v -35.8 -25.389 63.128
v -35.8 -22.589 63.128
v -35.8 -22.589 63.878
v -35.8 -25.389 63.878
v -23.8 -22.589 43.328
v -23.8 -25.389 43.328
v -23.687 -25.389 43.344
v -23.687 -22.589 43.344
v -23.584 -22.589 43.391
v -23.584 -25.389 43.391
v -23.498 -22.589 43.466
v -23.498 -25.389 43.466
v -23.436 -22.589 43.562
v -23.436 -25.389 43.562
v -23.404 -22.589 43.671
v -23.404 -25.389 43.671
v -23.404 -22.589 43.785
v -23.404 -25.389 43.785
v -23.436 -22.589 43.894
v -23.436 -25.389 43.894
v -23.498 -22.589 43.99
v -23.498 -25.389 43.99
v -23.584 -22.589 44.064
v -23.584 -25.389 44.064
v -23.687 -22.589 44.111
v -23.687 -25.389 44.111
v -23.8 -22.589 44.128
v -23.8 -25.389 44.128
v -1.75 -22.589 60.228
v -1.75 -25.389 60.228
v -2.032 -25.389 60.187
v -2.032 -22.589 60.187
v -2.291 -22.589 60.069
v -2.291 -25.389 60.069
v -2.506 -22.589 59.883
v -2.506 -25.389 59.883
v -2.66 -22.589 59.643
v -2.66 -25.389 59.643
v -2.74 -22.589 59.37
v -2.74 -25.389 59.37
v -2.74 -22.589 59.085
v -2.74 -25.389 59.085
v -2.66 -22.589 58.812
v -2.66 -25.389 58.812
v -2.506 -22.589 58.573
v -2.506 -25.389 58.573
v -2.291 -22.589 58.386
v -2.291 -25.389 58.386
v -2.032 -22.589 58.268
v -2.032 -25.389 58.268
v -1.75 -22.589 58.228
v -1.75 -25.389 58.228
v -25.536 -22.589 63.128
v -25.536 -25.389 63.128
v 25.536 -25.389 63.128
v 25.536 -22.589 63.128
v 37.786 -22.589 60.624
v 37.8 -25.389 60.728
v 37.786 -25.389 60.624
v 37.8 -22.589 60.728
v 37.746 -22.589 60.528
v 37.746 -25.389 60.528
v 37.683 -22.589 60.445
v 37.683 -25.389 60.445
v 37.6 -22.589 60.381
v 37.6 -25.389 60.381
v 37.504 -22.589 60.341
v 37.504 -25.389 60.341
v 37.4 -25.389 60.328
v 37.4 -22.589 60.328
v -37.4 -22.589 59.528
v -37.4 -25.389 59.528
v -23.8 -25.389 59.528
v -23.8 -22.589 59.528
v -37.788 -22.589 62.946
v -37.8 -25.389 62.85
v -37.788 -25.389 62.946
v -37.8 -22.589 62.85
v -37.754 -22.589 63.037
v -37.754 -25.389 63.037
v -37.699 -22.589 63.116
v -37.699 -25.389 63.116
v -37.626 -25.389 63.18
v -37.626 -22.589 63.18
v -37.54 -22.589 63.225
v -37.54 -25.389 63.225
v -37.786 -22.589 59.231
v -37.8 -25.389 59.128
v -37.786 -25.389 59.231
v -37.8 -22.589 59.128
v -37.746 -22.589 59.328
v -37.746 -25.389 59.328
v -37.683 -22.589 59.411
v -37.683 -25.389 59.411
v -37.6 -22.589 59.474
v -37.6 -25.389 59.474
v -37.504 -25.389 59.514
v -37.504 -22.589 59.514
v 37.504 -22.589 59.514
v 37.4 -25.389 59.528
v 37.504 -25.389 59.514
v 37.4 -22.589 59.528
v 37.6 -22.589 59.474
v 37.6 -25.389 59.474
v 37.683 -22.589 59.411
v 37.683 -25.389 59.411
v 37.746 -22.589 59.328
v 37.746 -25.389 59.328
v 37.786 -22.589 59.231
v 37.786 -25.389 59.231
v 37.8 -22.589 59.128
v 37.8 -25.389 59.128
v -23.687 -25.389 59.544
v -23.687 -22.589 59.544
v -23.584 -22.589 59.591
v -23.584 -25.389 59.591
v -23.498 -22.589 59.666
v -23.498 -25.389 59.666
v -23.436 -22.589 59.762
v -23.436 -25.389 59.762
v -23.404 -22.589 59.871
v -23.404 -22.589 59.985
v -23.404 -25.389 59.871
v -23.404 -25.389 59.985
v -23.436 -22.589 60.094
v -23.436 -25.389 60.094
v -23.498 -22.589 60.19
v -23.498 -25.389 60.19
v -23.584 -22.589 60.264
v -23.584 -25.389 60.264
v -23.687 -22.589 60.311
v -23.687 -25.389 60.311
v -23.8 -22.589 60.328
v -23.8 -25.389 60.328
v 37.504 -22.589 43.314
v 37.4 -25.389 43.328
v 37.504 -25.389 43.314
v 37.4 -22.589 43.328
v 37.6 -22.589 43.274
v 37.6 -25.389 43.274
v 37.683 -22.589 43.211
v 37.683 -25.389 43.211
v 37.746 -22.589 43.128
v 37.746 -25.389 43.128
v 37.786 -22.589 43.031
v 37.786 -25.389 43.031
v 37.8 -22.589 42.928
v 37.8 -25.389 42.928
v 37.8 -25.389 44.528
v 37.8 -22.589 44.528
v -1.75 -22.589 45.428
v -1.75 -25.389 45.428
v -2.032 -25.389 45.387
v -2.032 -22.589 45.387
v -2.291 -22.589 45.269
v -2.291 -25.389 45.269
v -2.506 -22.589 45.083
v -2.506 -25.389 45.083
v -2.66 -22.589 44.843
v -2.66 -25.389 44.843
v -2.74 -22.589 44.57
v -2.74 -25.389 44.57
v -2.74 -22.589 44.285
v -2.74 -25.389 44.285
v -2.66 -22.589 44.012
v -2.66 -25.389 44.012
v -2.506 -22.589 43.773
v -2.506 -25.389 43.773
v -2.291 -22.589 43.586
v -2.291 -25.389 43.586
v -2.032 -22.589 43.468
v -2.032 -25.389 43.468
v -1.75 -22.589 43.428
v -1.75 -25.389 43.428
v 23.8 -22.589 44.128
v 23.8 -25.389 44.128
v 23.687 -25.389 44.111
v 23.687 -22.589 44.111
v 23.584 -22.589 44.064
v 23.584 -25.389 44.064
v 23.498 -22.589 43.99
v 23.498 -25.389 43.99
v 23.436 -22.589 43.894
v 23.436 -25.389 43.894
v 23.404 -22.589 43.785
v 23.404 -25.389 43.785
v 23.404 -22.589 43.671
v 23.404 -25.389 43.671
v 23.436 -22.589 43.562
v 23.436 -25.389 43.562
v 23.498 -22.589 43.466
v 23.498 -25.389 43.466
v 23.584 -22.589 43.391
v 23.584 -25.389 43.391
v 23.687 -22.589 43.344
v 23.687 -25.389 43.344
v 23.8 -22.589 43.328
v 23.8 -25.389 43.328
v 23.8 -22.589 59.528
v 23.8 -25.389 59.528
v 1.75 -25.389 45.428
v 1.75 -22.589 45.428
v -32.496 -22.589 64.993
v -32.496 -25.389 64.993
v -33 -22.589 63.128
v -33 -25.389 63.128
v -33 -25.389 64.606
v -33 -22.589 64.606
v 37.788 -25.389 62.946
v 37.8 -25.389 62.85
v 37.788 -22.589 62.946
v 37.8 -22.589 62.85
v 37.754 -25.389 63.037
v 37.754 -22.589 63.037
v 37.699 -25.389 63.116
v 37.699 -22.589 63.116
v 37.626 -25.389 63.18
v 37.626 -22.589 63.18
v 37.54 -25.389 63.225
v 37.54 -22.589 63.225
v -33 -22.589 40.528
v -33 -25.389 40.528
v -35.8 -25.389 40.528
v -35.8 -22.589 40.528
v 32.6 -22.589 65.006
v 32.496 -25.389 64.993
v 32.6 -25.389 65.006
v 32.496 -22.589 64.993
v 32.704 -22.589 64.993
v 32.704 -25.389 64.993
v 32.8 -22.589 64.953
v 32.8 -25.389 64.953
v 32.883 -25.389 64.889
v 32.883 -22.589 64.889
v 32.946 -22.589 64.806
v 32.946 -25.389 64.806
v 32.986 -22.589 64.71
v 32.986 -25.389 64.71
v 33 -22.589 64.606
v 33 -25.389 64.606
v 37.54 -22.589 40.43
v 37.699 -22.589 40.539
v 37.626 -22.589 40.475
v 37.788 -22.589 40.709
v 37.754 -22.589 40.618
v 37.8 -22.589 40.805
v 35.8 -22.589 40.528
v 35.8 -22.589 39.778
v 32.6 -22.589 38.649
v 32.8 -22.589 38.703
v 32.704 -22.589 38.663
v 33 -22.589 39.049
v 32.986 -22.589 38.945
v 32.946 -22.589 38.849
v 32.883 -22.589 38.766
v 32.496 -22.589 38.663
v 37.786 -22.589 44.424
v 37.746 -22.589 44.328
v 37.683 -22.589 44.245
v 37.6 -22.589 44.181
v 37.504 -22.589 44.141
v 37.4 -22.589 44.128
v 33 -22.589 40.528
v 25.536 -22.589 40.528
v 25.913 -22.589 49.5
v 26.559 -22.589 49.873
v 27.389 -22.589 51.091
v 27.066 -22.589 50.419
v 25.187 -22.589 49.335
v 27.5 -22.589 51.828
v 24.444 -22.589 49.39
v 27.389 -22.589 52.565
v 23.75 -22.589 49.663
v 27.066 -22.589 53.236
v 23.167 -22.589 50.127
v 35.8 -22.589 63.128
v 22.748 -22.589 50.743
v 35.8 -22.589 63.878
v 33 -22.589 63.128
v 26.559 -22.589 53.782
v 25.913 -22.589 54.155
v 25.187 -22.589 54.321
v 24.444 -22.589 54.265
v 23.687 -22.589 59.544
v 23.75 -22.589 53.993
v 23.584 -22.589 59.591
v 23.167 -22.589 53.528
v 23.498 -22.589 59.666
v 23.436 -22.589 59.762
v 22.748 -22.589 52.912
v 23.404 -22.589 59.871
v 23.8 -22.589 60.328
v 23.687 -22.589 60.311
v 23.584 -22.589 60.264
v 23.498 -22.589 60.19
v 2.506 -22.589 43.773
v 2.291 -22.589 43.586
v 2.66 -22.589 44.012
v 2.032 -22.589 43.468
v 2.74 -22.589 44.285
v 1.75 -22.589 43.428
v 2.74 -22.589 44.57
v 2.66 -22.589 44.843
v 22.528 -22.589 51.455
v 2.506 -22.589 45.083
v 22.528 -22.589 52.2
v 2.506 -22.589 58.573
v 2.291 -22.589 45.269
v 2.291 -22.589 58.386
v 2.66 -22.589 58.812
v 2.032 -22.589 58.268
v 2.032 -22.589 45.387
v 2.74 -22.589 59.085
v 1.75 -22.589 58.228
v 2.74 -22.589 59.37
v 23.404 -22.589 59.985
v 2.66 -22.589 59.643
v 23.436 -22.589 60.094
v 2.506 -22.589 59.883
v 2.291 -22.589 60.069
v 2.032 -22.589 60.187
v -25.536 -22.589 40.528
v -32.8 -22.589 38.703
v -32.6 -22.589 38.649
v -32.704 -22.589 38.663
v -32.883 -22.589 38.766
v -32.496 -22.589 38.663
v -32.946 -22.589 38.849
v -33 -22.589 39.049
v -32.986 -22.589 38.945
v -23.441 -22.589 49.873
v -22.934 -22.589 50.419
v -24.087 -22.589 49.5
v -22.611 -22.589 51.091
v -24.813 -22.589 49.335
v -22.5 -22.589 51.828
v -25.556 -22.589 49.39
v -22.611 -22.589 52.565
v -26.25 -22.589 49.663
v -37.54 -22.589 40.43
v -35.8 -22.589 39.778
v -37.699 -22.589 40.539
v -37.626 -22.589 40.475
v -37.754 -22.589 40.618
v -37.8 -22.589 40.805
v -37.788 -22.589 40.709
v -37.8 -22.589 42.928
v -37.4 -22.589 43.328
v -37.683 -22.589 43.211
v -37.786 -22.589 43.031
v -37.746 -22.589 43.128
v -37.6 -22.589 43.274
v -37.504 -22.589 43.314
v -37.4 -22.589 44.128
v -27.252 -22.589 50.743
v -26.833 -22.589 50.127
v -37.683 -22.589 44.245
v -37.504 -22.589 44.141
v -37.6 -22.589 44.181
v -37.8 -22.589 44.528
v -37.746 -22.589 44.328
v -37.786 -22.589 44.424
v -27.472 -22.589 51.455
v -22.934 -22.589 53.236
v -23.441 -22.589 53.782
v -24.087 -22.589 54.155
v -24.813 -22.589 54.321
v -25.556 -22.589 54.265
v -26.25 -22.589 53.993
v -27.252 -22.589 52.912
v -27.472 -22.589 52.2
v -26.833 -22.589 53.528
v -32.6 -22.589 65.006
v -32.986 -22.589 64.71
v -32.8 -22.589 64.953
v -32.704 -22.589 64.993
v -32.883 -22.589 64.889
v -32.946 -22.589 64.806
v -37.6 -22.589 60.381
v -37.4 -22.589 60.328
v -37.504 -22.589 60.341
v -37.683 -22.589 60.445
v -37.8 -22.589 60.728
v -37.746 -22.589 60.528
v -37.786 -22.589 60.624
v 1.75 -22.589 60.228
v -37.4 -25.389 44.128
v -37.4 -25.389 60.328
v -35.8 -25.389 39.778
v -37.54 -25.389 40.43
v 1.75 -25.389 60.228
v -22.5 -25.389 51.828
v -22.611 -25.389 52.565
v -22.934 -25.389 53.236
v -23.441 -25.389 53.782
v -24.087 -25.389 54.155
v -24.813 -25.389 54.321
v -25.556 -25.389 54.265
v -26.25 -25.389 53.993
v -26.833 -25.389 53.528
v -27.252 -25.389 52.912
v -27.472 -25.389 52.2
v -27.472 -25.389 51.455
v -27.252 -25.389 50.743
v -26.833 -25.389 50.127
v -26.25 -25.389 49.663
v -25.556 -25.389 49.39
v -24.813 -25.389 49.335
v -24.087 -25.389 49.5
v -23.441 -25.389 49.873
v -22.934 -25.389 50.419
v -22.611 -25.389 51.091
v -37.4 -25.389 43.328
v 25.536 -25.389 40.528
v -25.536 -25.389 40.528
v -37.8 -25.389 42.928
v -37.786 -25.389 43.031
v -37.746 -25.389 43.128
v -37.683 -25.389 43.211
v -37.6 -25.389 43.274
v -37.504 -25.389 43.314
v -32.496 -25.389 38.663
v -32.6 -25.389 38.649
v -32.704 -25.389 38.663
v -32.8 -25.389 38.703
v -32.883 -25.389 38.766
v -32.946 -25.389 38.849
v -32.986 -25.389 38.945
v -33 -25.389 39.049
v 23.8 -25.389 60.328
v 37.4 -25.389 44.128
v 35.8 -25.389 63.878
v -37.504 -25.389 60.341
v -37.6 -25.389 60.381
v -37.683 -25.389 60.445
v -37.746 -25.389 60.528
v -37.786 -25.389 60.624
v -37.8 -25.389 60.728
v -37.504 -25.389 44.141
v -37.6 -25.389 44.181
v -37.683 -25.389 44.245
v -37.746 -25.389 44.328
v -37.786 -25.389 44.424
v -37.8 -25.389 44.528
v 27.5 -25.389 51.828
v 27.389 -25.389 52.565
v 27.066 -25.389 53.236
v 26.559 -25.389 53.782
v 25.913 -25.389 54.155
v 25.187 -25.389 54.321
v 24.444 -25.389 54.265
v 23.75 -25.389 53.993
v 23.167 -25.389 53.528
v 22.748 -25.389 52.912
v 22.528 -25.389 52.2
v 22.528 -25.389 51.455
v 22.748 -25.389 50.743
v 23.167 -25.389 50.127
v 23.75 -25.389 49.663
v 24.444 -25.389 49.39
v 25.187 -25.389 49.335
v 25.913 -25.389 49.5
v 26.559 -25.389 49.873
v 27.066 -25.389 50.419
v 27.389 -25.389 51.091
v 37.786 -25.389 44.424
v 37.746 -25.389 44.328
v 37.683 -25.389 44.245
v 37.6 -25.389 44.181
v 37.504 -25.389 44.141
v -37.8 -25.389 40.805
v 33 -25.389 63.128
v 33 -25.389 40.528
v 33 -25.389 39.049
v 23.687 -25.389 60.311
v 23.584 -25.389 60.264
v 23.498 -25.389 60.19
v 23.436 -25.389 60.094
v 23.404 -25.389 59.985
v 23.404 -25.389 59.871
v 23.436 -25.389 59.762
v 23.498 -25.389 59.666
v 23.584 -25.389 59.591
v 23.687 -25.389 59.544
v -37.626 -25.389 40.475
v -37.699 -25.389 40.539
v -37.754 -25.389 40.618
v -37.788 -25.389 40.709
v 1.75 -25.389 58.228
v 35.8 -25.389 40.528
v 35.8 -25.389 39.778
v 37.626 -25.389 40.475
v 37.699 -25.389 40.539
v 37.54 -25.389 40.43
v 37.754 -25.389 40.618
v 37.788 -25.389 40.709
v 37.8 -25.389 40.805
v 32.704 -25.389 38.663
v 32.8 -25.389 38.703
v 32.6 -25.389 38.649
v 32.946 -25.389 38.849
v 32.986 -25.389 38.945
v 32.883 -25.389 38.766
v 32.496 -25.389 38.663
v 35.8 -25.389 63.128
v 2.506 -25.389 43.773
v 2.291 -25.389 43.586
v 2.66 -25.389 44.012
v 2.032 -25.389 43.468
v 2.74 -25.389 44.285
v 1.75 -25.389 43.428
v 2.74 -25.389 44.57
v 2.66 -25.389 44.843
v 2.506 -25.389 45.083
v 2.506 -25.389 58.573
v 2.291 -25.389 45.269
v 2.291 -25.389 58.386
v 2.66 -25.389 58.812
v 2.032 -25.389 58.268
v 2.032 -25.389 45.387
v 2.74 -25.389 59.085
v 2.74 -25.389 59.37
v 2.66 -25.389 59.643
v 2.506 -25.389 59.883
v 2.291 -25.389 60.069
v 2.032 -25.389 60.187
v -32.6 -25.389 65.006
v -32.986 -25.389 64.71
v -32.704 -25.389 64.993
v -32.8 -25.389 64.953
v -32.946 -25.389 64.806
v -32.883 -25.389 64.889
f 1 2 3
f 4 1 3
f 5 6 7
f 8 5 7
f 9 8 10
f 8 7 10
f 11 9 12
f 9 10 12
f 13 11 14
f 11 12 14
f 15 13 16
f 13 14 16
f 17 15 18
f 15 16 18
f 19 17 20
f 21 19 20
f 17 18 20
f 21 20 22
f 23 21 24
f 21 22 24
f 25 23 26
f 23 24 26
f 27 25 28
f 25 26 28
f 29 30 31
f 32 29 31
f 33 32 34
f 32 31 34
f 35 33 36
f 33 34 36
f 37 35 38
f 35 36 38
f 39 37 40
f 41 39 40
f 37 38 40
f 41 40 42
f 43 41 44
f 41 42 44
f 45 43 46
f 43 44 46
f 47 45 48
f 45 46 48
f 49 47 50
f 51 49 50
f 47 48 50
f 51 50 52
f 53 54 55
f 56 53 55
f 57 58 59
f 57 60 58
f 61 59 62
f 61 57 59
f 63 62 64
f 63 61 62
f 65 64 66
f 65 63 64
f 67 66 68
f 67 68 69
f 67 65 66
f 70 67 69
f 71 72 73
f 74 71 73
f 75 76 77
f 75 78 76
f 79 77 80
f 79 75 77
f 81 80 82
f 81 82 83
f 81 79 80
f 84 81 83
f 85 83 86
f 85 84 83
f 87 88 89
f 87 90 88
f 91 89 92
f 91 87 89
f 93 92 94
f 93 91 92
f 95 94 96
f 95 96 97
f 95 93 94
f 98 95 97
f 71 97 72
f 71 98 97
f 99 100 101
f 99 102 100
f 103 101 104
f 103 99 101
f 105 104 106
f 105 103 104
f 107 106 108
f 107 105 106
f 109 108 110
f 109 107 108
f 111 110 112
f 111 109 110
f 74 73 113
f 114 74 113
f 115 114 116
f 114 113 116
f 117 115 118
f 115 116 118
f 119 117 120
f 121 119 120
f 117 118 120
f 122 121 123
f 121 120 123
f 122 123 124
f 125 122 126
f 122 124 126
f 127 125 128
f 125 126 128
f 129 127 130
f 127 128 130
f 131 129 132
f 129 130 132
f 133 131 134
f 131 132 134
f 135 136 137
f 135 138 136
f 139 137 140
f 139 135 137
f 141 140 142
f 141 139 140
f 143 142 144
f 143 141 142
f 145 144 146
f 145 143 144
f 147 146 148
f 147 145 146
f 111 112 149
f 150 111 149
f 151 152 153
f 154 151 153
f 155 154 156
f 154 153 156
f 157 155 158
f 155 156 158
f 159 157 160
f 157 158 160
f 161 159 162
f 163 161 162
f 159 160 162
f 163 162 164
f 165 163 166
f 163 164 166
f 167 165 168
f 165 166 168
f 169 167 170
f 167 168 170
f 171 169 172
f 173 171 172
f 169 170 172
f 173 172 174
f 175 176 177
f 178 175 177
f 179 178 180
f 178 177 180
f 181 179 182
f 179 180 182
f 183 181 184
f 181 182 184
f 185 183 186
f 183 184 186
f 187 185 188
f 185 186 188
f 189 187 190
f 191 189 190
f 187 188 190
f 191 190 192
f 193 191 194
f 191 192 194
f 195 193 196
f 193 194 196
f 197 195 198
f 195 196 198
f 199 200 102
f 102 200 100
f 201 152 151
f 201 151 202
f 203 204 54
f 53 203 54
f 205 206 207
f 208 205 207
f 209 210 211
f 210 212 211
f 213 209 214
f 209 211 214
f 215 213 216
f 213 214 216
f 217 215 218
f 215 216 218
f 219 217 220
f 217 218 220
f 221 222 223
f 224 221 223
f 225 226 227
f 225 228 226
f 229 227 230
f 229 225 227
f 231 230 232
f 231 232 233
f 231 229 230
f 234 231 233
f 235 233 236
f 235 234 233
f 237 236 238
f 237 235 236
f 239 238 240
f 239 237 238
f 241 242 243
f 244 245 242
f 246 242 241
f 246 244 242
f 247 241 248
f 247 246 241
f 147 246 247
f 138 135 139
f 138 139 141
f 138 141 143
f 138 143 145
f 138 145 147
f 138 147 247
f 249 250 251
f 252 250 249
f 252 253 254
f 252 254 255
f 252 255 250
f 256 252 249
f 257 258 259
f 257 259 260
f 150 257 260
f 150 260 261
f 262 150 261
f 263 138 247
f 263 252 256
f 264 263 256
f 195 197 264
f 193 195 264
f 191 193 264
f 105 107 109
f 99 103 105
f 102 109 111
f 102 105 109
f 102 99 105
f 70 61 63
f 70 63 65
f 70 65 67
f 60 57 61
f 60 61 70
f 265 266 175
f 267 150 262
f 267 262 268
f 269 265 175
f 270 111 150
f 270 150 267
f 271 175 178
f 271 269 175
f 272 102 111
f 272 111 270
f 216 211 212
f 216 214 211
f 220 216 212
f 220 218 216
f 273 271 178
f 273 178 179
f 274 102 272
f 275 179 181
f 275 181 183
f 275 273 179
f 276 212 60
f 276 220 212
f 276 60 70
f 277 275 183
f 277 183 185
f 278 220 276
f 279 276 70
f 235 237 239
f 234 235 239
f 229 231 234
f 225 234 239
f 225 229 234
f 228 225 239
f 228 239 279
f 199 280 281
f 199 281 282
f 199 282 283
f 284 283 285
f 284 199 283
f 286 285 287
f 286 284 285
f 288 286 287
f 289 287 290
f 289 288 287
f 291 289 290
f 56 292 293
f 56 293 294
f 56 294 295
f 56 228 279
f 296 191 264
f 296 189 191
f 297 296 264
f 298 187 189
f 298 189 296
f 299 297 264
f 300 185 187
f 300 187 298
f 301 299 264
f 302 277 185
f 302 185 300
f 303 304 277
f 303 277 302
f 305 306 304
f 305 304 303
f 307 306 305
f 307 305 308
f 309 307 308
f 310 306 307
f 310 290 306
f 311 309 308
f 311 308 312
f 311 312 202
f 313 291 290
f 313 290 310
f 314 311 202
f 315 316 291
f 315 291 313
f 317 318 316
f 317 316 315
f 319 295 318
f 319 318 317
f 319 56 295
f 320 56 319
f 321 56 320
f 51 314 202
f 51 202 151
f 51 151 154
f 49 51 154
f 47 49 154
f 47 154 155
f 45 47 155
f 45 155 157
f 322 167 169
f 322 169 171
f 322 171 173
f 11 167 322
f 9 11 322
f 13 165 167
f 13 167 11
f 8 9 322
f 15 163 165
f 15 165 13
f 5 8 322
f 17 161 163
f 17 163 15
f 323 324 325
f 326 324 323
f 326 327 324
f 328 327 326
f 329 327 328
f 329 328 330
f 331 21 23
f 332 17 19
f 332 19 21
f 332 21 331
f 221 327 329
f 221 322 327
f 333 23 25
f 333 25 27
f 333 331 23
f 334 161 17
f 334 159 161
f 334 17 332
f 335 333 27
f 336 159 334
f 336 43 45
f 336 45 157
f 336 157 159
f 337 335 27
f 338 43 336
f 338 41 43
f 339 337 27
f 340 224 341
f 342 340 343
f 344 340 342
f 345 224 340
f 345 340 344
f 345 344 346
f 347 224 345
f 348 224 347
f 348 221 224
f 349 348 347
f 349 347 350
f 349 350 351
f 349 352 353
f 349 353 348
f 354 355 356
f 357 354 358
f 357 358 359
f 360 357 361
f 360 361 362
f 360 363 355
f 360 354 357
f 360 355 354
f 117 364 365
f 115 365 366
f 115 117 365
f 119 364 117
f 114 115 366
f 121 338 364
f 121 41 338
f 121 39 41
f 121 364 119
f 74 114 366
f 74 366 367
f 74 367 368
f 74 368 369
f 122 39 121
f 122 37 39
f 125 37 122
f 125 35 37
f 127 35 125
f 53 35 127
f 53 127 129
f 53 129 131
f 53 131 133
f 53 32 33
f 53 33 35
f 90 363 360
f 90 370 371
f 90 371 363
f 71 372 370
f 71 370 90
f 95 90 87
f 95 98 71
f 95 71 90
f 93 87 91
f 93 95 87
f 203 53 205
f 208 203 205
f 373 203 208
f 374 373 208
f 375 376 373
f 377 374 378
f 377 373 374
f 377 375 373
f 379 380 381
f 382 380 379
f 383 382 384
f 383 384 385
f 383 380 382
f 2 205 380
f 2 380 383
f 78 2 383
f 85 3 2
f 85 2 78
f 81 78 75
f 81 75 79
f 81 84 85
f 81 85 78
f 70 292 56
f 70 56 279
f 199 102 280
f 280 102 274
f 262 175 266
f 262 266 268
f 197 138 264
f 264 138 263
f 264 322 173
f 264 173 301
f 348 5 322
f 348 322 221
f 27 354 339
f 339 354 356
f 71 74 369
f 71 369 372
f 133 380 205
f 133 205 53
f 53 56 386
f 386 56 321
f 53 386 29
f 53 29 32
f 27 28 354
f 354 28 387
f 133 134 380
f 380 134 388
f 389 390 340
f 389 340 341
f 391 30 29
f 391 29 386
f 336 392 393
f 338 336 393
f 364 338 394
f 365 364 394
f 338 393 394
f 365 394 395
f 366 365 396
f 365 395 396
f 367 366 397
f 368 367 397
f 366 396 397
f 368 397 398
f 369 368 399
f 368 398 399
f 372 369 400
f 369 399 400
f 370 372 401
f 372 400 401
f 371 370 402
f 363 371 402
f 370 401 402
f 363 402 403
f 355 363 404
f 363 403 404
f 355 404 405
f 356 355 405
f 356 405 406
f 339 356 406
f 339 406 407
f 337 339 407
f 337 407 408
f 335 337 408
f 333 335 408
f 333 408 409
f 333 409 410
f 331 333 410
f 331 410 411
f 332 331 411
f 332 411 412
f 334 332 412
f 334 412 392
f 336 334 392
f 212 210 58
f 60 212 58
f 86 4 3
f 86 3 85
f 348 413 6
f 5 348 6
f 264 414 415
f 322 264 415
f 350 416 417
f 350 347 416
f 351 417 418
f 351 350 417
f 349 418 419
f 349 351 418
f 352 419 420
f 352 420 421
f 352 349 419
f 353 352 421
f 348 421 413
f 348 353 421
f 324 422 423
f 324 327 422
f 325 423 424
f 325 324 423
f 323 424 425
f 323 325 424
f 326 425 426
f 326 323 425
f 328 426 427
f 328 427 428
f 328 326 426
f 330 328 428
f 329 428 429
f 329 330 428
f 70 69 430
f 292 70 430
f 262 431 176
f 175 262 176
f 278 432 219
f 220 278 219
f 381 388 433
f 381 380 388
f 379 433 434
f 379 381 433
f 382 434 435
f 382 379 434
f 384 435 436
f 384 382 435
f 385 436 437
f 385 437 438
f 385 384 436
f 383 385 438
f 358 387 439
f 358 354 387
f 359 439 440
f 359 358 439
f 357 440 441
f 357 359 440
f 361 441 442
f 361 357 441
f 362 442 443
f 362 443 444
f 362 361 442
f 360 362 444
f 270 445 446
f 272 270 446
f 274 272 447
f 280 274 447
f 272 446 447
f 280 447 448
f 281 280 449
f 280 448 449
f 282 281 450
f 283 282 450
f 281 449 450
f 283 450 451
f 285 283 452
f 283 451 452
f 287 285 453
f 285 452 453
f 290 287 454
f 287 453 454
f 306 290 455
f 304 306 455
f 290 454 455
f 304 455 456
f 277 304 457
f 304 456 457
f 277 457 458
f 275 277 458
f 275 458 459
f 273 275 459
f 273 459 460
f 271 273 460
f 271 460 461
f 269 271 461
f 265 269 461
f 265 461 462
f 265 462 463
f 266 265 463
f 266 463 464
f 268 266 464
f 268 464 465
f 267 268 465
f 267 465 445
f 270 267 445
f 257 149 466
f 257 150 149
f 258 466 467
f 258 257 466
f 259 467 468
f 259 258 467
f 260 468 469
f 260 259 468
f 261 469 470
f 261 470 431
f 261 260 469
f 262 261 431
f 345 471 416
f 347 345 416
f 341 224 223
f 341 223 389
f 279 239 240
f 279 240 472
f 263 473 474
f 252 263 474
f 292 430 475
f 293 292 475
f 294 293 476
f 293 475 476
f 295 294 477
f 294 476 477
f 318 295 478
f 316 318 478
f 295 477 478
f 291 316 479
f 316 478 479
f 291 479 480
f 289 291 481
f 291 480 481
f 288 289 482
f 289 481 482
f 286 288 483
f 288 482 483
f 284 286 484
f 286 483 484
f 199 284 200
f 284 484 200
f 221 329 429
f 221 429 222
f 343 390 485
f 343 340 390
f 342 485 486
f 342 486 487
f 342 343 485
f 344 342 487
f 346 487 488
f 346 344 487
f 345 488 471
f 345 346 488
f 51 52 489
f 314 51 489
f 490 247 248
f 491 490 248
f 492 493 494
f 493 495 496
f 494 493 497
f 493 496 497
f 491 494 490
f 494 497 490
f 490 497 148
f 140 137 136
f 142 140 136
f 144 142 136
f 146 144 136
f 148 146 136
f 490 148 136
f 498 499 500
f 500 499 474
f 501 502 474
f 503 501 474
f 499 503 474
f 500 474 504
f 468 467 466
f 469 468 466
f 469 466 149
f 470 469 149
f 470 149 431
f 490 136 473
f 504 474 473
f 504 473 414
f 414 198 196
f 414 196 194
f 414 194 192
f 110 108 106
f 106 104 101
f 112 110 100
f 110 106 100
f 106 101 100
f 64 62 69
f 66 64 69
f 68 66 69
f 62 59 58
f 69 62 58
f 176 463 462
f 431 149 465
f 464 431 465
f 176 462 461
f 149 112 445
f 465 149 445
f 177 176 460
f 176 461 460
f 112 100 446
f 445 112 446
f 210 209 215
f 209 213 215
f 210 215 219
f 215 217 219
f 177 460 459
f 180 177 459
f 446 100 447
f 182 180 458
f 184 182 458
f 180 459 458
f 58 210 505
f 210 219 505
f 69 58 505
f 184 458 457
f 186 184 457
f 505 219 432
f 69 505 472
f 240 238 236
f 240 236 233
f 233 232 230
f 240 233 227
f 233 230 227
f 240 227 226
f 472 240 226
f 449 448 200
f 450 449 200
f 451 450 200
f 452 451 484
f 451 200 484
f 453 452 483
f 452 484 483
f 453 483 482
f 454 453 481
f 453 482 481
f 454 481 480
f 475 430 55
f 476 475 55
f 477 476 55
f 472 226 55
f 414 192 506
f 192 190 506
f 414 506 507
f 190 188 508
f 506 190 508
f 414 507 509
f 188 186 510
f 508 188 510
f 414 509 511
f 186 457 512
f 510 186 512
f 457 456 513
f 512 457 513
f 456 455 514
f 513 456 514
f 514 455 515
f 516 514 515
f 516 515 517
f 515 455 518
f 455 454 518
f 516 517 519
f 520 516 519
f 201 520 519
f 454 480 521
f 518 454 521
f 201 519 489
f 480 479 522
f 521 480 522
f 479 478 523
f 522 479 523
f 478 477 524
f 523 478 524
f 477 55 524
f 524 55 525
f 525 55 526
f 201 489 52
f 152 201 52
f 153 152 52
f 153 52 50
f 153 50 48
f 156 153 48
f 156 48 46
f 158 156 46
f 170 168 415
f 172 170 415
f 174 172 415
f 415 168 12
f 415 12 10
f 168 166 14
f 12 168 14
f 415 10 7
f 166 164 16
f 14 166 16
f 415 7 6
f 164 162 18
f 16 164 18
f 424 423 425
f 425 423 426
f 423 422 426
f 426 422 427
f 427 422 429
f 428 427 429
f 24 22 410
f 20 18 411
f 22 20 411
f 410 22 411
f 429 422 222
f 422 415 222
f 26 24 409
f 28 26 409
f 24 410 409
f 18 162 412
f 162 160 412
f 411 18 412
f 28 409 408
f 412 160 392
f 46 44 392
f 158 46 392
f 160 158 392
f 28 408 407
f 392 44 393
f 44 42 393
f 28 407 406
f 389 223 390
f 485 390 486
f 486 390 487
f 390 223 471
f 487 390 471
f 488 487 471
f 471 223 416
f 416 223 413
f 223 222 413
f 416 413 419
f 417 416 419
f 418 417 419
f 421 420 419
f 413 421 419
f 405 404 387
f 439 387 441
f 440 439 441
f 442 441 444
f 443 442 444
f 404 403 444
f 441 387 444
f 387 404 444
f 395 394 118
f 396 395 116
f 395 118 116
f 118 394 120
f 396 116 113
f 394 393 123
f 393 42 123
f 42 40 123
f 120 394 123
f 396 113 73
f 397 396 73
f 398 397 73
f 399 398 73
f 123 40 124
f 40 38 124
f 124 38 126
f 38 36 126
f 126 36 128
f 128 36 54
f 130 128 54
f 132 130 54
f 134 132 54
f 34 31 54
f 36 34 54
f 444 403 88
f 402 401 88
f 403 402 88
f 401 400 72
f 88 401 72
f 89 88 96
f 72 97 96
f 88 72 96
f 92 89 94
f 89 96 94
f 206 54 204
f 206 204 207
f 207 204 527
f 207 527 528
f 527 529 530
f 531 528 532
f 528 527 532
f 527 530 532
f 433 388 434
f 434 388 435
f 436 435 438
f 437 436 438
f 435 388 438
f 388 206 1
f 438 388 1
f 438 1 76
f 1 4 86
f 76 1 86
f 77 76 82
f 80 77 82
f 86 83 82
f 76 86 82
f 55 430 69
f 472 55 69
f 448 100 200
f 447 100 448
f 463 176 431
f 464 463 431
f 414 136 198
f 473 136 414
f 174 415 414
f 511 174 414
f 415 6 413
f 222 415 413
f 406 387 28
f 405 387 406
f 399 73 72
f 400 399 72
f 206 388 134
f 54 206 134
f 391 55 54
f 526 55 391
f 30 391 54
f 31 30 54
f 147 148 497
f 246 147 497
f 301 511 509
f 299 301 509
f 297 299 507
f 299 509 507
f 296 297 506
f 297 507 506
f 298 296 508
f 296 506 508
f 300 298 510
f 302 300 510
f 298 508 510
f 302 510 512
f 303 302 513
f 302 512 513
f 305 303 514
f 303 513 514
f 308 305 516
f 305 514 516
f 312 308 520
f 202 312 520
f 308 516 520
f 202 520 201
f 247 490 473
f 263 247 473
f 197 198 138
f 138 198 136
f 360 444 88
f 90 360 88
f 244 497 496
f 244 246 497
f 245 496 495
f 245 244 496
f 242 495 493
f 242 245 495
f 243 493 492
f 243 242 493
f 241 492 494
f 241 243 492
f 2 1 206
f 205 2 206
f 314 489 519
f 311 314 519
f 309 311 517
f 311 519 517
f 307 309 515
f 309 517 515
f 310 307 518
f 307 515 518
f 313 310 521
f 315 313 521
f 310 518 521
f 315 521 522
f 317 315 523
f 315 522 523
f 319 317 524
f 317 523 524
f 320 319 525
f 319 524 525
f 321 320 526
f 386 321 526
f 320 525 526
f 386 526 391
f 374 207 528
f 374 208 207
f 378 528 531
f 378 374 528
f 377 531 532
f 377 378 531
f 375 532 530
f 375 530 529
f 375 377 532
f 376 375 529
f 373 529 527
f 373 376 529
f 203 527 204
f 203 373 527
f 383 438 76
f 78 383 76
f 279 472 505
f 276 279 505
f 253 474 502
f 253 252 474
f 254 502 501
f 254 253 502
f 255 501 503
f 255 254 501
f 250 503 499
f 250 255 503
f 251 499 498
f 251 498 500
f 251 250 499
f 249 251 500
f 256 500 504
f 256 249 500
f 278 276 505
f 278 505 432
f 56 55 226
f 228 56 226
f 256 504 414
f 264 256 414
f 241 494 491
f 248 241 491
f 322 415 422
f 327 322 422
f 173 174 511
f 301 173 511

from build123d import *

# Parameters (mm, degrees)
PAD010_DEPTH    = 2.8
FILLET003_R     = 0.4
SKETCH016_R     = 2.5
POCKET008_DEPTH = 2.801
POCKET_DEPTH    = 2.801


with BuildPart() as part:
    # Sketch010 (on Face2 of ShapeBinder009) → Pad010 (new body)
    with BuildSketch(Plane.XZ.offset(25.388718)):
        with BuildLine():
            Line((37.8, 63.127675), (37.8, 60.327675))
            Line((37.8, 60.327675), (23.8, 60.327675))
            ThreePointArc((23.8, 60.327675), (23.4, 59.927675), (23.8, 59.527675))
            Line((23.8, 59.527675), (37.8, 59.527675))
            Line((37.8, 59.527675), (37.8, 44.127675))
            Line((37.8, 44.127675), (23.8, 44.127675))
            ThreePointArc((23.8, 44.127675), (23.4, 43.727675), (23.8, 43.327675))
            Line((23.8, 43.327675), (37.8, 43.327675))
            Line((37.8, 43.327675), (37.8, 40.527675))
            Line((37.8, 40.527675), (35.8, 39.777675))
            Line((35.8, 40.527675), (35.8, 39.777675))
            Line((35.8, 40.527675), (33, 40.527675))
            Line((33, 40.527675), (33, 38.527675))
            Line((33, 38.527675), (25.535898, 40.527675))
            Line((25.535898, 40.527675), (-25.535898, 40.527675))
            Line((-25.535898, 40.527675), (-33, 38.527675))
            Line((-33, 38.527675), (-33, 40.527675))
            Line((-33, 40.527675), (-35.8, 40.527675))
            Line((-35.8, 40.527675), (-35.8, 39.777675))
            Line((-37.8, 40.527675), (-35.8, 39.777675))
            Line((-37.8, 40.527675), (-37.8, 43.327675))
            Line((-37.8, 43.327675), (-23.8, 43.327675))
            ThreePointArc((-23.8, 43.327675), (-23.4, 43.727675), (-23.8, 44.127675))
            Line((-23.8, 44.127675), (-37.8, 44.127675))
            Line((-37.8, 44.127675), (-37.8, 59.527675))
            Line((-37.8, 59.527675), (-23.8, 59.527675))
            ThreePointArc((-23.8, 59.527675), (-23.4, 59.927675), (-23.8, 60.327675))
            Line((-23.8, 60.327675), (-37.8, 60.327675))
            Line((-37.8, 60.327675), (-37.8, 63.127675))
            Line((-35.8, 63.877675), (-37.8, 63.127675))
            Line((-35.8, 63.127675), (-35.8, 63.877675))
            Line((-35.8, 63.127675), (-33, 63.127675))
            Line((-33, 63.127675), (-33, 65.127675))
            Line((-33, 65.127675), (-25.535898, 63.127675))
            Line((-25.535898, 63.127675), (25.535898, 63.127675))
            Line((25.535898, 63.127675), (33, 65.127675))
            Line((33, 65.127675), (33, 63.127675))
            Line((33, 63.127675), (35.8, 63.127675))
            Line((35.8, 63.127675), (35.8, 63.877675))
            Line((35.8, 63.877675), (37.8, 63.127675))
        make_face()
    extrude(amount=-PAD010_DEPTH)

    # Fillet003
    fillet003_edges = [part.edges().sort_by_distance(p)[0] for p in [
        (33, -23.988718, 65.127675),
        (37.8, -23.988718, 63.127675),
        (37.8, -23.988718, 60.327675),
        (37.8, -23.988718, 59.527675),
        (37.8, -23.988718, 44.127675),
        (37.8, -23.988718, 43.327675),
        (37.8, -23.988718, 40.527675),
        (33, -23.988718, 38.527675),
        (-33, -23.988718, 65.127675),
        (-37.8, -23.988718, 63.127675),
        (-37.8, -23.988718, 60.327675),
        (-37.8, -23.988718, 59.527675),
        (-37.8, -23.988718, 44.127675),
        (-37.8, -23.988718, 43.327675),
        (-37.8, -23.988718, 40.527675),
        (-33, -23.988718, 38.527675),
    ]]
    fillet(fillet003_edges, radius=FILLET003_R)

    # Sketch016 (on Face2 of Fillet003) → Pocket008 (cut, through all)
    with BuildSketch(Plane.XZ.offset(25.388718)):
        with Locations((-25, 51.827675)):
            Circle(SKETCH016_R)
        with Locations((25, 51.827675)):
            Circle(SKETCH016_R)
    extrude(amount=-POCKET008_DEPTH, mode=Mode.SUBTRACT)

    # Sketch018 (on Face2 of Pocket008) → Pocket (cut, through all)
    with BuildSketch(Plane.XZ.offset(25.388718)):
        with BuildLine():
            ThreePointArc((-1.75, 60.227675), (-2.75, 59.227675), (-1.75, 58.227675))
            Line((-1.75, 58.227675), (1.75, 58.227675))
            ThreePointArc((1.75, 58.227675), (2.75, 59.227675), (1.75, 60.227675))
            Line((-1.75, 60.227675), (1.75, 60.227675))
        make_face()
        with BuildLine():
            ThreePointArc((-1.75, 45.427675), (-2.75, 44.427675), (-1.75, 43.427675))
            Line((-1.75, 43.427675), (1.75, 43.427675))
            ThreePointArc((1.75, 43.427675), (2.75, 44.427675), (1.75, 45.427675))
            Line((-1.75, 45.427675), (1.75, 45.427675))
        make_face()
    extrude(amount=-POCKET_DEPTH, mode=Mode.SUBTRACT)


solid = part.part
